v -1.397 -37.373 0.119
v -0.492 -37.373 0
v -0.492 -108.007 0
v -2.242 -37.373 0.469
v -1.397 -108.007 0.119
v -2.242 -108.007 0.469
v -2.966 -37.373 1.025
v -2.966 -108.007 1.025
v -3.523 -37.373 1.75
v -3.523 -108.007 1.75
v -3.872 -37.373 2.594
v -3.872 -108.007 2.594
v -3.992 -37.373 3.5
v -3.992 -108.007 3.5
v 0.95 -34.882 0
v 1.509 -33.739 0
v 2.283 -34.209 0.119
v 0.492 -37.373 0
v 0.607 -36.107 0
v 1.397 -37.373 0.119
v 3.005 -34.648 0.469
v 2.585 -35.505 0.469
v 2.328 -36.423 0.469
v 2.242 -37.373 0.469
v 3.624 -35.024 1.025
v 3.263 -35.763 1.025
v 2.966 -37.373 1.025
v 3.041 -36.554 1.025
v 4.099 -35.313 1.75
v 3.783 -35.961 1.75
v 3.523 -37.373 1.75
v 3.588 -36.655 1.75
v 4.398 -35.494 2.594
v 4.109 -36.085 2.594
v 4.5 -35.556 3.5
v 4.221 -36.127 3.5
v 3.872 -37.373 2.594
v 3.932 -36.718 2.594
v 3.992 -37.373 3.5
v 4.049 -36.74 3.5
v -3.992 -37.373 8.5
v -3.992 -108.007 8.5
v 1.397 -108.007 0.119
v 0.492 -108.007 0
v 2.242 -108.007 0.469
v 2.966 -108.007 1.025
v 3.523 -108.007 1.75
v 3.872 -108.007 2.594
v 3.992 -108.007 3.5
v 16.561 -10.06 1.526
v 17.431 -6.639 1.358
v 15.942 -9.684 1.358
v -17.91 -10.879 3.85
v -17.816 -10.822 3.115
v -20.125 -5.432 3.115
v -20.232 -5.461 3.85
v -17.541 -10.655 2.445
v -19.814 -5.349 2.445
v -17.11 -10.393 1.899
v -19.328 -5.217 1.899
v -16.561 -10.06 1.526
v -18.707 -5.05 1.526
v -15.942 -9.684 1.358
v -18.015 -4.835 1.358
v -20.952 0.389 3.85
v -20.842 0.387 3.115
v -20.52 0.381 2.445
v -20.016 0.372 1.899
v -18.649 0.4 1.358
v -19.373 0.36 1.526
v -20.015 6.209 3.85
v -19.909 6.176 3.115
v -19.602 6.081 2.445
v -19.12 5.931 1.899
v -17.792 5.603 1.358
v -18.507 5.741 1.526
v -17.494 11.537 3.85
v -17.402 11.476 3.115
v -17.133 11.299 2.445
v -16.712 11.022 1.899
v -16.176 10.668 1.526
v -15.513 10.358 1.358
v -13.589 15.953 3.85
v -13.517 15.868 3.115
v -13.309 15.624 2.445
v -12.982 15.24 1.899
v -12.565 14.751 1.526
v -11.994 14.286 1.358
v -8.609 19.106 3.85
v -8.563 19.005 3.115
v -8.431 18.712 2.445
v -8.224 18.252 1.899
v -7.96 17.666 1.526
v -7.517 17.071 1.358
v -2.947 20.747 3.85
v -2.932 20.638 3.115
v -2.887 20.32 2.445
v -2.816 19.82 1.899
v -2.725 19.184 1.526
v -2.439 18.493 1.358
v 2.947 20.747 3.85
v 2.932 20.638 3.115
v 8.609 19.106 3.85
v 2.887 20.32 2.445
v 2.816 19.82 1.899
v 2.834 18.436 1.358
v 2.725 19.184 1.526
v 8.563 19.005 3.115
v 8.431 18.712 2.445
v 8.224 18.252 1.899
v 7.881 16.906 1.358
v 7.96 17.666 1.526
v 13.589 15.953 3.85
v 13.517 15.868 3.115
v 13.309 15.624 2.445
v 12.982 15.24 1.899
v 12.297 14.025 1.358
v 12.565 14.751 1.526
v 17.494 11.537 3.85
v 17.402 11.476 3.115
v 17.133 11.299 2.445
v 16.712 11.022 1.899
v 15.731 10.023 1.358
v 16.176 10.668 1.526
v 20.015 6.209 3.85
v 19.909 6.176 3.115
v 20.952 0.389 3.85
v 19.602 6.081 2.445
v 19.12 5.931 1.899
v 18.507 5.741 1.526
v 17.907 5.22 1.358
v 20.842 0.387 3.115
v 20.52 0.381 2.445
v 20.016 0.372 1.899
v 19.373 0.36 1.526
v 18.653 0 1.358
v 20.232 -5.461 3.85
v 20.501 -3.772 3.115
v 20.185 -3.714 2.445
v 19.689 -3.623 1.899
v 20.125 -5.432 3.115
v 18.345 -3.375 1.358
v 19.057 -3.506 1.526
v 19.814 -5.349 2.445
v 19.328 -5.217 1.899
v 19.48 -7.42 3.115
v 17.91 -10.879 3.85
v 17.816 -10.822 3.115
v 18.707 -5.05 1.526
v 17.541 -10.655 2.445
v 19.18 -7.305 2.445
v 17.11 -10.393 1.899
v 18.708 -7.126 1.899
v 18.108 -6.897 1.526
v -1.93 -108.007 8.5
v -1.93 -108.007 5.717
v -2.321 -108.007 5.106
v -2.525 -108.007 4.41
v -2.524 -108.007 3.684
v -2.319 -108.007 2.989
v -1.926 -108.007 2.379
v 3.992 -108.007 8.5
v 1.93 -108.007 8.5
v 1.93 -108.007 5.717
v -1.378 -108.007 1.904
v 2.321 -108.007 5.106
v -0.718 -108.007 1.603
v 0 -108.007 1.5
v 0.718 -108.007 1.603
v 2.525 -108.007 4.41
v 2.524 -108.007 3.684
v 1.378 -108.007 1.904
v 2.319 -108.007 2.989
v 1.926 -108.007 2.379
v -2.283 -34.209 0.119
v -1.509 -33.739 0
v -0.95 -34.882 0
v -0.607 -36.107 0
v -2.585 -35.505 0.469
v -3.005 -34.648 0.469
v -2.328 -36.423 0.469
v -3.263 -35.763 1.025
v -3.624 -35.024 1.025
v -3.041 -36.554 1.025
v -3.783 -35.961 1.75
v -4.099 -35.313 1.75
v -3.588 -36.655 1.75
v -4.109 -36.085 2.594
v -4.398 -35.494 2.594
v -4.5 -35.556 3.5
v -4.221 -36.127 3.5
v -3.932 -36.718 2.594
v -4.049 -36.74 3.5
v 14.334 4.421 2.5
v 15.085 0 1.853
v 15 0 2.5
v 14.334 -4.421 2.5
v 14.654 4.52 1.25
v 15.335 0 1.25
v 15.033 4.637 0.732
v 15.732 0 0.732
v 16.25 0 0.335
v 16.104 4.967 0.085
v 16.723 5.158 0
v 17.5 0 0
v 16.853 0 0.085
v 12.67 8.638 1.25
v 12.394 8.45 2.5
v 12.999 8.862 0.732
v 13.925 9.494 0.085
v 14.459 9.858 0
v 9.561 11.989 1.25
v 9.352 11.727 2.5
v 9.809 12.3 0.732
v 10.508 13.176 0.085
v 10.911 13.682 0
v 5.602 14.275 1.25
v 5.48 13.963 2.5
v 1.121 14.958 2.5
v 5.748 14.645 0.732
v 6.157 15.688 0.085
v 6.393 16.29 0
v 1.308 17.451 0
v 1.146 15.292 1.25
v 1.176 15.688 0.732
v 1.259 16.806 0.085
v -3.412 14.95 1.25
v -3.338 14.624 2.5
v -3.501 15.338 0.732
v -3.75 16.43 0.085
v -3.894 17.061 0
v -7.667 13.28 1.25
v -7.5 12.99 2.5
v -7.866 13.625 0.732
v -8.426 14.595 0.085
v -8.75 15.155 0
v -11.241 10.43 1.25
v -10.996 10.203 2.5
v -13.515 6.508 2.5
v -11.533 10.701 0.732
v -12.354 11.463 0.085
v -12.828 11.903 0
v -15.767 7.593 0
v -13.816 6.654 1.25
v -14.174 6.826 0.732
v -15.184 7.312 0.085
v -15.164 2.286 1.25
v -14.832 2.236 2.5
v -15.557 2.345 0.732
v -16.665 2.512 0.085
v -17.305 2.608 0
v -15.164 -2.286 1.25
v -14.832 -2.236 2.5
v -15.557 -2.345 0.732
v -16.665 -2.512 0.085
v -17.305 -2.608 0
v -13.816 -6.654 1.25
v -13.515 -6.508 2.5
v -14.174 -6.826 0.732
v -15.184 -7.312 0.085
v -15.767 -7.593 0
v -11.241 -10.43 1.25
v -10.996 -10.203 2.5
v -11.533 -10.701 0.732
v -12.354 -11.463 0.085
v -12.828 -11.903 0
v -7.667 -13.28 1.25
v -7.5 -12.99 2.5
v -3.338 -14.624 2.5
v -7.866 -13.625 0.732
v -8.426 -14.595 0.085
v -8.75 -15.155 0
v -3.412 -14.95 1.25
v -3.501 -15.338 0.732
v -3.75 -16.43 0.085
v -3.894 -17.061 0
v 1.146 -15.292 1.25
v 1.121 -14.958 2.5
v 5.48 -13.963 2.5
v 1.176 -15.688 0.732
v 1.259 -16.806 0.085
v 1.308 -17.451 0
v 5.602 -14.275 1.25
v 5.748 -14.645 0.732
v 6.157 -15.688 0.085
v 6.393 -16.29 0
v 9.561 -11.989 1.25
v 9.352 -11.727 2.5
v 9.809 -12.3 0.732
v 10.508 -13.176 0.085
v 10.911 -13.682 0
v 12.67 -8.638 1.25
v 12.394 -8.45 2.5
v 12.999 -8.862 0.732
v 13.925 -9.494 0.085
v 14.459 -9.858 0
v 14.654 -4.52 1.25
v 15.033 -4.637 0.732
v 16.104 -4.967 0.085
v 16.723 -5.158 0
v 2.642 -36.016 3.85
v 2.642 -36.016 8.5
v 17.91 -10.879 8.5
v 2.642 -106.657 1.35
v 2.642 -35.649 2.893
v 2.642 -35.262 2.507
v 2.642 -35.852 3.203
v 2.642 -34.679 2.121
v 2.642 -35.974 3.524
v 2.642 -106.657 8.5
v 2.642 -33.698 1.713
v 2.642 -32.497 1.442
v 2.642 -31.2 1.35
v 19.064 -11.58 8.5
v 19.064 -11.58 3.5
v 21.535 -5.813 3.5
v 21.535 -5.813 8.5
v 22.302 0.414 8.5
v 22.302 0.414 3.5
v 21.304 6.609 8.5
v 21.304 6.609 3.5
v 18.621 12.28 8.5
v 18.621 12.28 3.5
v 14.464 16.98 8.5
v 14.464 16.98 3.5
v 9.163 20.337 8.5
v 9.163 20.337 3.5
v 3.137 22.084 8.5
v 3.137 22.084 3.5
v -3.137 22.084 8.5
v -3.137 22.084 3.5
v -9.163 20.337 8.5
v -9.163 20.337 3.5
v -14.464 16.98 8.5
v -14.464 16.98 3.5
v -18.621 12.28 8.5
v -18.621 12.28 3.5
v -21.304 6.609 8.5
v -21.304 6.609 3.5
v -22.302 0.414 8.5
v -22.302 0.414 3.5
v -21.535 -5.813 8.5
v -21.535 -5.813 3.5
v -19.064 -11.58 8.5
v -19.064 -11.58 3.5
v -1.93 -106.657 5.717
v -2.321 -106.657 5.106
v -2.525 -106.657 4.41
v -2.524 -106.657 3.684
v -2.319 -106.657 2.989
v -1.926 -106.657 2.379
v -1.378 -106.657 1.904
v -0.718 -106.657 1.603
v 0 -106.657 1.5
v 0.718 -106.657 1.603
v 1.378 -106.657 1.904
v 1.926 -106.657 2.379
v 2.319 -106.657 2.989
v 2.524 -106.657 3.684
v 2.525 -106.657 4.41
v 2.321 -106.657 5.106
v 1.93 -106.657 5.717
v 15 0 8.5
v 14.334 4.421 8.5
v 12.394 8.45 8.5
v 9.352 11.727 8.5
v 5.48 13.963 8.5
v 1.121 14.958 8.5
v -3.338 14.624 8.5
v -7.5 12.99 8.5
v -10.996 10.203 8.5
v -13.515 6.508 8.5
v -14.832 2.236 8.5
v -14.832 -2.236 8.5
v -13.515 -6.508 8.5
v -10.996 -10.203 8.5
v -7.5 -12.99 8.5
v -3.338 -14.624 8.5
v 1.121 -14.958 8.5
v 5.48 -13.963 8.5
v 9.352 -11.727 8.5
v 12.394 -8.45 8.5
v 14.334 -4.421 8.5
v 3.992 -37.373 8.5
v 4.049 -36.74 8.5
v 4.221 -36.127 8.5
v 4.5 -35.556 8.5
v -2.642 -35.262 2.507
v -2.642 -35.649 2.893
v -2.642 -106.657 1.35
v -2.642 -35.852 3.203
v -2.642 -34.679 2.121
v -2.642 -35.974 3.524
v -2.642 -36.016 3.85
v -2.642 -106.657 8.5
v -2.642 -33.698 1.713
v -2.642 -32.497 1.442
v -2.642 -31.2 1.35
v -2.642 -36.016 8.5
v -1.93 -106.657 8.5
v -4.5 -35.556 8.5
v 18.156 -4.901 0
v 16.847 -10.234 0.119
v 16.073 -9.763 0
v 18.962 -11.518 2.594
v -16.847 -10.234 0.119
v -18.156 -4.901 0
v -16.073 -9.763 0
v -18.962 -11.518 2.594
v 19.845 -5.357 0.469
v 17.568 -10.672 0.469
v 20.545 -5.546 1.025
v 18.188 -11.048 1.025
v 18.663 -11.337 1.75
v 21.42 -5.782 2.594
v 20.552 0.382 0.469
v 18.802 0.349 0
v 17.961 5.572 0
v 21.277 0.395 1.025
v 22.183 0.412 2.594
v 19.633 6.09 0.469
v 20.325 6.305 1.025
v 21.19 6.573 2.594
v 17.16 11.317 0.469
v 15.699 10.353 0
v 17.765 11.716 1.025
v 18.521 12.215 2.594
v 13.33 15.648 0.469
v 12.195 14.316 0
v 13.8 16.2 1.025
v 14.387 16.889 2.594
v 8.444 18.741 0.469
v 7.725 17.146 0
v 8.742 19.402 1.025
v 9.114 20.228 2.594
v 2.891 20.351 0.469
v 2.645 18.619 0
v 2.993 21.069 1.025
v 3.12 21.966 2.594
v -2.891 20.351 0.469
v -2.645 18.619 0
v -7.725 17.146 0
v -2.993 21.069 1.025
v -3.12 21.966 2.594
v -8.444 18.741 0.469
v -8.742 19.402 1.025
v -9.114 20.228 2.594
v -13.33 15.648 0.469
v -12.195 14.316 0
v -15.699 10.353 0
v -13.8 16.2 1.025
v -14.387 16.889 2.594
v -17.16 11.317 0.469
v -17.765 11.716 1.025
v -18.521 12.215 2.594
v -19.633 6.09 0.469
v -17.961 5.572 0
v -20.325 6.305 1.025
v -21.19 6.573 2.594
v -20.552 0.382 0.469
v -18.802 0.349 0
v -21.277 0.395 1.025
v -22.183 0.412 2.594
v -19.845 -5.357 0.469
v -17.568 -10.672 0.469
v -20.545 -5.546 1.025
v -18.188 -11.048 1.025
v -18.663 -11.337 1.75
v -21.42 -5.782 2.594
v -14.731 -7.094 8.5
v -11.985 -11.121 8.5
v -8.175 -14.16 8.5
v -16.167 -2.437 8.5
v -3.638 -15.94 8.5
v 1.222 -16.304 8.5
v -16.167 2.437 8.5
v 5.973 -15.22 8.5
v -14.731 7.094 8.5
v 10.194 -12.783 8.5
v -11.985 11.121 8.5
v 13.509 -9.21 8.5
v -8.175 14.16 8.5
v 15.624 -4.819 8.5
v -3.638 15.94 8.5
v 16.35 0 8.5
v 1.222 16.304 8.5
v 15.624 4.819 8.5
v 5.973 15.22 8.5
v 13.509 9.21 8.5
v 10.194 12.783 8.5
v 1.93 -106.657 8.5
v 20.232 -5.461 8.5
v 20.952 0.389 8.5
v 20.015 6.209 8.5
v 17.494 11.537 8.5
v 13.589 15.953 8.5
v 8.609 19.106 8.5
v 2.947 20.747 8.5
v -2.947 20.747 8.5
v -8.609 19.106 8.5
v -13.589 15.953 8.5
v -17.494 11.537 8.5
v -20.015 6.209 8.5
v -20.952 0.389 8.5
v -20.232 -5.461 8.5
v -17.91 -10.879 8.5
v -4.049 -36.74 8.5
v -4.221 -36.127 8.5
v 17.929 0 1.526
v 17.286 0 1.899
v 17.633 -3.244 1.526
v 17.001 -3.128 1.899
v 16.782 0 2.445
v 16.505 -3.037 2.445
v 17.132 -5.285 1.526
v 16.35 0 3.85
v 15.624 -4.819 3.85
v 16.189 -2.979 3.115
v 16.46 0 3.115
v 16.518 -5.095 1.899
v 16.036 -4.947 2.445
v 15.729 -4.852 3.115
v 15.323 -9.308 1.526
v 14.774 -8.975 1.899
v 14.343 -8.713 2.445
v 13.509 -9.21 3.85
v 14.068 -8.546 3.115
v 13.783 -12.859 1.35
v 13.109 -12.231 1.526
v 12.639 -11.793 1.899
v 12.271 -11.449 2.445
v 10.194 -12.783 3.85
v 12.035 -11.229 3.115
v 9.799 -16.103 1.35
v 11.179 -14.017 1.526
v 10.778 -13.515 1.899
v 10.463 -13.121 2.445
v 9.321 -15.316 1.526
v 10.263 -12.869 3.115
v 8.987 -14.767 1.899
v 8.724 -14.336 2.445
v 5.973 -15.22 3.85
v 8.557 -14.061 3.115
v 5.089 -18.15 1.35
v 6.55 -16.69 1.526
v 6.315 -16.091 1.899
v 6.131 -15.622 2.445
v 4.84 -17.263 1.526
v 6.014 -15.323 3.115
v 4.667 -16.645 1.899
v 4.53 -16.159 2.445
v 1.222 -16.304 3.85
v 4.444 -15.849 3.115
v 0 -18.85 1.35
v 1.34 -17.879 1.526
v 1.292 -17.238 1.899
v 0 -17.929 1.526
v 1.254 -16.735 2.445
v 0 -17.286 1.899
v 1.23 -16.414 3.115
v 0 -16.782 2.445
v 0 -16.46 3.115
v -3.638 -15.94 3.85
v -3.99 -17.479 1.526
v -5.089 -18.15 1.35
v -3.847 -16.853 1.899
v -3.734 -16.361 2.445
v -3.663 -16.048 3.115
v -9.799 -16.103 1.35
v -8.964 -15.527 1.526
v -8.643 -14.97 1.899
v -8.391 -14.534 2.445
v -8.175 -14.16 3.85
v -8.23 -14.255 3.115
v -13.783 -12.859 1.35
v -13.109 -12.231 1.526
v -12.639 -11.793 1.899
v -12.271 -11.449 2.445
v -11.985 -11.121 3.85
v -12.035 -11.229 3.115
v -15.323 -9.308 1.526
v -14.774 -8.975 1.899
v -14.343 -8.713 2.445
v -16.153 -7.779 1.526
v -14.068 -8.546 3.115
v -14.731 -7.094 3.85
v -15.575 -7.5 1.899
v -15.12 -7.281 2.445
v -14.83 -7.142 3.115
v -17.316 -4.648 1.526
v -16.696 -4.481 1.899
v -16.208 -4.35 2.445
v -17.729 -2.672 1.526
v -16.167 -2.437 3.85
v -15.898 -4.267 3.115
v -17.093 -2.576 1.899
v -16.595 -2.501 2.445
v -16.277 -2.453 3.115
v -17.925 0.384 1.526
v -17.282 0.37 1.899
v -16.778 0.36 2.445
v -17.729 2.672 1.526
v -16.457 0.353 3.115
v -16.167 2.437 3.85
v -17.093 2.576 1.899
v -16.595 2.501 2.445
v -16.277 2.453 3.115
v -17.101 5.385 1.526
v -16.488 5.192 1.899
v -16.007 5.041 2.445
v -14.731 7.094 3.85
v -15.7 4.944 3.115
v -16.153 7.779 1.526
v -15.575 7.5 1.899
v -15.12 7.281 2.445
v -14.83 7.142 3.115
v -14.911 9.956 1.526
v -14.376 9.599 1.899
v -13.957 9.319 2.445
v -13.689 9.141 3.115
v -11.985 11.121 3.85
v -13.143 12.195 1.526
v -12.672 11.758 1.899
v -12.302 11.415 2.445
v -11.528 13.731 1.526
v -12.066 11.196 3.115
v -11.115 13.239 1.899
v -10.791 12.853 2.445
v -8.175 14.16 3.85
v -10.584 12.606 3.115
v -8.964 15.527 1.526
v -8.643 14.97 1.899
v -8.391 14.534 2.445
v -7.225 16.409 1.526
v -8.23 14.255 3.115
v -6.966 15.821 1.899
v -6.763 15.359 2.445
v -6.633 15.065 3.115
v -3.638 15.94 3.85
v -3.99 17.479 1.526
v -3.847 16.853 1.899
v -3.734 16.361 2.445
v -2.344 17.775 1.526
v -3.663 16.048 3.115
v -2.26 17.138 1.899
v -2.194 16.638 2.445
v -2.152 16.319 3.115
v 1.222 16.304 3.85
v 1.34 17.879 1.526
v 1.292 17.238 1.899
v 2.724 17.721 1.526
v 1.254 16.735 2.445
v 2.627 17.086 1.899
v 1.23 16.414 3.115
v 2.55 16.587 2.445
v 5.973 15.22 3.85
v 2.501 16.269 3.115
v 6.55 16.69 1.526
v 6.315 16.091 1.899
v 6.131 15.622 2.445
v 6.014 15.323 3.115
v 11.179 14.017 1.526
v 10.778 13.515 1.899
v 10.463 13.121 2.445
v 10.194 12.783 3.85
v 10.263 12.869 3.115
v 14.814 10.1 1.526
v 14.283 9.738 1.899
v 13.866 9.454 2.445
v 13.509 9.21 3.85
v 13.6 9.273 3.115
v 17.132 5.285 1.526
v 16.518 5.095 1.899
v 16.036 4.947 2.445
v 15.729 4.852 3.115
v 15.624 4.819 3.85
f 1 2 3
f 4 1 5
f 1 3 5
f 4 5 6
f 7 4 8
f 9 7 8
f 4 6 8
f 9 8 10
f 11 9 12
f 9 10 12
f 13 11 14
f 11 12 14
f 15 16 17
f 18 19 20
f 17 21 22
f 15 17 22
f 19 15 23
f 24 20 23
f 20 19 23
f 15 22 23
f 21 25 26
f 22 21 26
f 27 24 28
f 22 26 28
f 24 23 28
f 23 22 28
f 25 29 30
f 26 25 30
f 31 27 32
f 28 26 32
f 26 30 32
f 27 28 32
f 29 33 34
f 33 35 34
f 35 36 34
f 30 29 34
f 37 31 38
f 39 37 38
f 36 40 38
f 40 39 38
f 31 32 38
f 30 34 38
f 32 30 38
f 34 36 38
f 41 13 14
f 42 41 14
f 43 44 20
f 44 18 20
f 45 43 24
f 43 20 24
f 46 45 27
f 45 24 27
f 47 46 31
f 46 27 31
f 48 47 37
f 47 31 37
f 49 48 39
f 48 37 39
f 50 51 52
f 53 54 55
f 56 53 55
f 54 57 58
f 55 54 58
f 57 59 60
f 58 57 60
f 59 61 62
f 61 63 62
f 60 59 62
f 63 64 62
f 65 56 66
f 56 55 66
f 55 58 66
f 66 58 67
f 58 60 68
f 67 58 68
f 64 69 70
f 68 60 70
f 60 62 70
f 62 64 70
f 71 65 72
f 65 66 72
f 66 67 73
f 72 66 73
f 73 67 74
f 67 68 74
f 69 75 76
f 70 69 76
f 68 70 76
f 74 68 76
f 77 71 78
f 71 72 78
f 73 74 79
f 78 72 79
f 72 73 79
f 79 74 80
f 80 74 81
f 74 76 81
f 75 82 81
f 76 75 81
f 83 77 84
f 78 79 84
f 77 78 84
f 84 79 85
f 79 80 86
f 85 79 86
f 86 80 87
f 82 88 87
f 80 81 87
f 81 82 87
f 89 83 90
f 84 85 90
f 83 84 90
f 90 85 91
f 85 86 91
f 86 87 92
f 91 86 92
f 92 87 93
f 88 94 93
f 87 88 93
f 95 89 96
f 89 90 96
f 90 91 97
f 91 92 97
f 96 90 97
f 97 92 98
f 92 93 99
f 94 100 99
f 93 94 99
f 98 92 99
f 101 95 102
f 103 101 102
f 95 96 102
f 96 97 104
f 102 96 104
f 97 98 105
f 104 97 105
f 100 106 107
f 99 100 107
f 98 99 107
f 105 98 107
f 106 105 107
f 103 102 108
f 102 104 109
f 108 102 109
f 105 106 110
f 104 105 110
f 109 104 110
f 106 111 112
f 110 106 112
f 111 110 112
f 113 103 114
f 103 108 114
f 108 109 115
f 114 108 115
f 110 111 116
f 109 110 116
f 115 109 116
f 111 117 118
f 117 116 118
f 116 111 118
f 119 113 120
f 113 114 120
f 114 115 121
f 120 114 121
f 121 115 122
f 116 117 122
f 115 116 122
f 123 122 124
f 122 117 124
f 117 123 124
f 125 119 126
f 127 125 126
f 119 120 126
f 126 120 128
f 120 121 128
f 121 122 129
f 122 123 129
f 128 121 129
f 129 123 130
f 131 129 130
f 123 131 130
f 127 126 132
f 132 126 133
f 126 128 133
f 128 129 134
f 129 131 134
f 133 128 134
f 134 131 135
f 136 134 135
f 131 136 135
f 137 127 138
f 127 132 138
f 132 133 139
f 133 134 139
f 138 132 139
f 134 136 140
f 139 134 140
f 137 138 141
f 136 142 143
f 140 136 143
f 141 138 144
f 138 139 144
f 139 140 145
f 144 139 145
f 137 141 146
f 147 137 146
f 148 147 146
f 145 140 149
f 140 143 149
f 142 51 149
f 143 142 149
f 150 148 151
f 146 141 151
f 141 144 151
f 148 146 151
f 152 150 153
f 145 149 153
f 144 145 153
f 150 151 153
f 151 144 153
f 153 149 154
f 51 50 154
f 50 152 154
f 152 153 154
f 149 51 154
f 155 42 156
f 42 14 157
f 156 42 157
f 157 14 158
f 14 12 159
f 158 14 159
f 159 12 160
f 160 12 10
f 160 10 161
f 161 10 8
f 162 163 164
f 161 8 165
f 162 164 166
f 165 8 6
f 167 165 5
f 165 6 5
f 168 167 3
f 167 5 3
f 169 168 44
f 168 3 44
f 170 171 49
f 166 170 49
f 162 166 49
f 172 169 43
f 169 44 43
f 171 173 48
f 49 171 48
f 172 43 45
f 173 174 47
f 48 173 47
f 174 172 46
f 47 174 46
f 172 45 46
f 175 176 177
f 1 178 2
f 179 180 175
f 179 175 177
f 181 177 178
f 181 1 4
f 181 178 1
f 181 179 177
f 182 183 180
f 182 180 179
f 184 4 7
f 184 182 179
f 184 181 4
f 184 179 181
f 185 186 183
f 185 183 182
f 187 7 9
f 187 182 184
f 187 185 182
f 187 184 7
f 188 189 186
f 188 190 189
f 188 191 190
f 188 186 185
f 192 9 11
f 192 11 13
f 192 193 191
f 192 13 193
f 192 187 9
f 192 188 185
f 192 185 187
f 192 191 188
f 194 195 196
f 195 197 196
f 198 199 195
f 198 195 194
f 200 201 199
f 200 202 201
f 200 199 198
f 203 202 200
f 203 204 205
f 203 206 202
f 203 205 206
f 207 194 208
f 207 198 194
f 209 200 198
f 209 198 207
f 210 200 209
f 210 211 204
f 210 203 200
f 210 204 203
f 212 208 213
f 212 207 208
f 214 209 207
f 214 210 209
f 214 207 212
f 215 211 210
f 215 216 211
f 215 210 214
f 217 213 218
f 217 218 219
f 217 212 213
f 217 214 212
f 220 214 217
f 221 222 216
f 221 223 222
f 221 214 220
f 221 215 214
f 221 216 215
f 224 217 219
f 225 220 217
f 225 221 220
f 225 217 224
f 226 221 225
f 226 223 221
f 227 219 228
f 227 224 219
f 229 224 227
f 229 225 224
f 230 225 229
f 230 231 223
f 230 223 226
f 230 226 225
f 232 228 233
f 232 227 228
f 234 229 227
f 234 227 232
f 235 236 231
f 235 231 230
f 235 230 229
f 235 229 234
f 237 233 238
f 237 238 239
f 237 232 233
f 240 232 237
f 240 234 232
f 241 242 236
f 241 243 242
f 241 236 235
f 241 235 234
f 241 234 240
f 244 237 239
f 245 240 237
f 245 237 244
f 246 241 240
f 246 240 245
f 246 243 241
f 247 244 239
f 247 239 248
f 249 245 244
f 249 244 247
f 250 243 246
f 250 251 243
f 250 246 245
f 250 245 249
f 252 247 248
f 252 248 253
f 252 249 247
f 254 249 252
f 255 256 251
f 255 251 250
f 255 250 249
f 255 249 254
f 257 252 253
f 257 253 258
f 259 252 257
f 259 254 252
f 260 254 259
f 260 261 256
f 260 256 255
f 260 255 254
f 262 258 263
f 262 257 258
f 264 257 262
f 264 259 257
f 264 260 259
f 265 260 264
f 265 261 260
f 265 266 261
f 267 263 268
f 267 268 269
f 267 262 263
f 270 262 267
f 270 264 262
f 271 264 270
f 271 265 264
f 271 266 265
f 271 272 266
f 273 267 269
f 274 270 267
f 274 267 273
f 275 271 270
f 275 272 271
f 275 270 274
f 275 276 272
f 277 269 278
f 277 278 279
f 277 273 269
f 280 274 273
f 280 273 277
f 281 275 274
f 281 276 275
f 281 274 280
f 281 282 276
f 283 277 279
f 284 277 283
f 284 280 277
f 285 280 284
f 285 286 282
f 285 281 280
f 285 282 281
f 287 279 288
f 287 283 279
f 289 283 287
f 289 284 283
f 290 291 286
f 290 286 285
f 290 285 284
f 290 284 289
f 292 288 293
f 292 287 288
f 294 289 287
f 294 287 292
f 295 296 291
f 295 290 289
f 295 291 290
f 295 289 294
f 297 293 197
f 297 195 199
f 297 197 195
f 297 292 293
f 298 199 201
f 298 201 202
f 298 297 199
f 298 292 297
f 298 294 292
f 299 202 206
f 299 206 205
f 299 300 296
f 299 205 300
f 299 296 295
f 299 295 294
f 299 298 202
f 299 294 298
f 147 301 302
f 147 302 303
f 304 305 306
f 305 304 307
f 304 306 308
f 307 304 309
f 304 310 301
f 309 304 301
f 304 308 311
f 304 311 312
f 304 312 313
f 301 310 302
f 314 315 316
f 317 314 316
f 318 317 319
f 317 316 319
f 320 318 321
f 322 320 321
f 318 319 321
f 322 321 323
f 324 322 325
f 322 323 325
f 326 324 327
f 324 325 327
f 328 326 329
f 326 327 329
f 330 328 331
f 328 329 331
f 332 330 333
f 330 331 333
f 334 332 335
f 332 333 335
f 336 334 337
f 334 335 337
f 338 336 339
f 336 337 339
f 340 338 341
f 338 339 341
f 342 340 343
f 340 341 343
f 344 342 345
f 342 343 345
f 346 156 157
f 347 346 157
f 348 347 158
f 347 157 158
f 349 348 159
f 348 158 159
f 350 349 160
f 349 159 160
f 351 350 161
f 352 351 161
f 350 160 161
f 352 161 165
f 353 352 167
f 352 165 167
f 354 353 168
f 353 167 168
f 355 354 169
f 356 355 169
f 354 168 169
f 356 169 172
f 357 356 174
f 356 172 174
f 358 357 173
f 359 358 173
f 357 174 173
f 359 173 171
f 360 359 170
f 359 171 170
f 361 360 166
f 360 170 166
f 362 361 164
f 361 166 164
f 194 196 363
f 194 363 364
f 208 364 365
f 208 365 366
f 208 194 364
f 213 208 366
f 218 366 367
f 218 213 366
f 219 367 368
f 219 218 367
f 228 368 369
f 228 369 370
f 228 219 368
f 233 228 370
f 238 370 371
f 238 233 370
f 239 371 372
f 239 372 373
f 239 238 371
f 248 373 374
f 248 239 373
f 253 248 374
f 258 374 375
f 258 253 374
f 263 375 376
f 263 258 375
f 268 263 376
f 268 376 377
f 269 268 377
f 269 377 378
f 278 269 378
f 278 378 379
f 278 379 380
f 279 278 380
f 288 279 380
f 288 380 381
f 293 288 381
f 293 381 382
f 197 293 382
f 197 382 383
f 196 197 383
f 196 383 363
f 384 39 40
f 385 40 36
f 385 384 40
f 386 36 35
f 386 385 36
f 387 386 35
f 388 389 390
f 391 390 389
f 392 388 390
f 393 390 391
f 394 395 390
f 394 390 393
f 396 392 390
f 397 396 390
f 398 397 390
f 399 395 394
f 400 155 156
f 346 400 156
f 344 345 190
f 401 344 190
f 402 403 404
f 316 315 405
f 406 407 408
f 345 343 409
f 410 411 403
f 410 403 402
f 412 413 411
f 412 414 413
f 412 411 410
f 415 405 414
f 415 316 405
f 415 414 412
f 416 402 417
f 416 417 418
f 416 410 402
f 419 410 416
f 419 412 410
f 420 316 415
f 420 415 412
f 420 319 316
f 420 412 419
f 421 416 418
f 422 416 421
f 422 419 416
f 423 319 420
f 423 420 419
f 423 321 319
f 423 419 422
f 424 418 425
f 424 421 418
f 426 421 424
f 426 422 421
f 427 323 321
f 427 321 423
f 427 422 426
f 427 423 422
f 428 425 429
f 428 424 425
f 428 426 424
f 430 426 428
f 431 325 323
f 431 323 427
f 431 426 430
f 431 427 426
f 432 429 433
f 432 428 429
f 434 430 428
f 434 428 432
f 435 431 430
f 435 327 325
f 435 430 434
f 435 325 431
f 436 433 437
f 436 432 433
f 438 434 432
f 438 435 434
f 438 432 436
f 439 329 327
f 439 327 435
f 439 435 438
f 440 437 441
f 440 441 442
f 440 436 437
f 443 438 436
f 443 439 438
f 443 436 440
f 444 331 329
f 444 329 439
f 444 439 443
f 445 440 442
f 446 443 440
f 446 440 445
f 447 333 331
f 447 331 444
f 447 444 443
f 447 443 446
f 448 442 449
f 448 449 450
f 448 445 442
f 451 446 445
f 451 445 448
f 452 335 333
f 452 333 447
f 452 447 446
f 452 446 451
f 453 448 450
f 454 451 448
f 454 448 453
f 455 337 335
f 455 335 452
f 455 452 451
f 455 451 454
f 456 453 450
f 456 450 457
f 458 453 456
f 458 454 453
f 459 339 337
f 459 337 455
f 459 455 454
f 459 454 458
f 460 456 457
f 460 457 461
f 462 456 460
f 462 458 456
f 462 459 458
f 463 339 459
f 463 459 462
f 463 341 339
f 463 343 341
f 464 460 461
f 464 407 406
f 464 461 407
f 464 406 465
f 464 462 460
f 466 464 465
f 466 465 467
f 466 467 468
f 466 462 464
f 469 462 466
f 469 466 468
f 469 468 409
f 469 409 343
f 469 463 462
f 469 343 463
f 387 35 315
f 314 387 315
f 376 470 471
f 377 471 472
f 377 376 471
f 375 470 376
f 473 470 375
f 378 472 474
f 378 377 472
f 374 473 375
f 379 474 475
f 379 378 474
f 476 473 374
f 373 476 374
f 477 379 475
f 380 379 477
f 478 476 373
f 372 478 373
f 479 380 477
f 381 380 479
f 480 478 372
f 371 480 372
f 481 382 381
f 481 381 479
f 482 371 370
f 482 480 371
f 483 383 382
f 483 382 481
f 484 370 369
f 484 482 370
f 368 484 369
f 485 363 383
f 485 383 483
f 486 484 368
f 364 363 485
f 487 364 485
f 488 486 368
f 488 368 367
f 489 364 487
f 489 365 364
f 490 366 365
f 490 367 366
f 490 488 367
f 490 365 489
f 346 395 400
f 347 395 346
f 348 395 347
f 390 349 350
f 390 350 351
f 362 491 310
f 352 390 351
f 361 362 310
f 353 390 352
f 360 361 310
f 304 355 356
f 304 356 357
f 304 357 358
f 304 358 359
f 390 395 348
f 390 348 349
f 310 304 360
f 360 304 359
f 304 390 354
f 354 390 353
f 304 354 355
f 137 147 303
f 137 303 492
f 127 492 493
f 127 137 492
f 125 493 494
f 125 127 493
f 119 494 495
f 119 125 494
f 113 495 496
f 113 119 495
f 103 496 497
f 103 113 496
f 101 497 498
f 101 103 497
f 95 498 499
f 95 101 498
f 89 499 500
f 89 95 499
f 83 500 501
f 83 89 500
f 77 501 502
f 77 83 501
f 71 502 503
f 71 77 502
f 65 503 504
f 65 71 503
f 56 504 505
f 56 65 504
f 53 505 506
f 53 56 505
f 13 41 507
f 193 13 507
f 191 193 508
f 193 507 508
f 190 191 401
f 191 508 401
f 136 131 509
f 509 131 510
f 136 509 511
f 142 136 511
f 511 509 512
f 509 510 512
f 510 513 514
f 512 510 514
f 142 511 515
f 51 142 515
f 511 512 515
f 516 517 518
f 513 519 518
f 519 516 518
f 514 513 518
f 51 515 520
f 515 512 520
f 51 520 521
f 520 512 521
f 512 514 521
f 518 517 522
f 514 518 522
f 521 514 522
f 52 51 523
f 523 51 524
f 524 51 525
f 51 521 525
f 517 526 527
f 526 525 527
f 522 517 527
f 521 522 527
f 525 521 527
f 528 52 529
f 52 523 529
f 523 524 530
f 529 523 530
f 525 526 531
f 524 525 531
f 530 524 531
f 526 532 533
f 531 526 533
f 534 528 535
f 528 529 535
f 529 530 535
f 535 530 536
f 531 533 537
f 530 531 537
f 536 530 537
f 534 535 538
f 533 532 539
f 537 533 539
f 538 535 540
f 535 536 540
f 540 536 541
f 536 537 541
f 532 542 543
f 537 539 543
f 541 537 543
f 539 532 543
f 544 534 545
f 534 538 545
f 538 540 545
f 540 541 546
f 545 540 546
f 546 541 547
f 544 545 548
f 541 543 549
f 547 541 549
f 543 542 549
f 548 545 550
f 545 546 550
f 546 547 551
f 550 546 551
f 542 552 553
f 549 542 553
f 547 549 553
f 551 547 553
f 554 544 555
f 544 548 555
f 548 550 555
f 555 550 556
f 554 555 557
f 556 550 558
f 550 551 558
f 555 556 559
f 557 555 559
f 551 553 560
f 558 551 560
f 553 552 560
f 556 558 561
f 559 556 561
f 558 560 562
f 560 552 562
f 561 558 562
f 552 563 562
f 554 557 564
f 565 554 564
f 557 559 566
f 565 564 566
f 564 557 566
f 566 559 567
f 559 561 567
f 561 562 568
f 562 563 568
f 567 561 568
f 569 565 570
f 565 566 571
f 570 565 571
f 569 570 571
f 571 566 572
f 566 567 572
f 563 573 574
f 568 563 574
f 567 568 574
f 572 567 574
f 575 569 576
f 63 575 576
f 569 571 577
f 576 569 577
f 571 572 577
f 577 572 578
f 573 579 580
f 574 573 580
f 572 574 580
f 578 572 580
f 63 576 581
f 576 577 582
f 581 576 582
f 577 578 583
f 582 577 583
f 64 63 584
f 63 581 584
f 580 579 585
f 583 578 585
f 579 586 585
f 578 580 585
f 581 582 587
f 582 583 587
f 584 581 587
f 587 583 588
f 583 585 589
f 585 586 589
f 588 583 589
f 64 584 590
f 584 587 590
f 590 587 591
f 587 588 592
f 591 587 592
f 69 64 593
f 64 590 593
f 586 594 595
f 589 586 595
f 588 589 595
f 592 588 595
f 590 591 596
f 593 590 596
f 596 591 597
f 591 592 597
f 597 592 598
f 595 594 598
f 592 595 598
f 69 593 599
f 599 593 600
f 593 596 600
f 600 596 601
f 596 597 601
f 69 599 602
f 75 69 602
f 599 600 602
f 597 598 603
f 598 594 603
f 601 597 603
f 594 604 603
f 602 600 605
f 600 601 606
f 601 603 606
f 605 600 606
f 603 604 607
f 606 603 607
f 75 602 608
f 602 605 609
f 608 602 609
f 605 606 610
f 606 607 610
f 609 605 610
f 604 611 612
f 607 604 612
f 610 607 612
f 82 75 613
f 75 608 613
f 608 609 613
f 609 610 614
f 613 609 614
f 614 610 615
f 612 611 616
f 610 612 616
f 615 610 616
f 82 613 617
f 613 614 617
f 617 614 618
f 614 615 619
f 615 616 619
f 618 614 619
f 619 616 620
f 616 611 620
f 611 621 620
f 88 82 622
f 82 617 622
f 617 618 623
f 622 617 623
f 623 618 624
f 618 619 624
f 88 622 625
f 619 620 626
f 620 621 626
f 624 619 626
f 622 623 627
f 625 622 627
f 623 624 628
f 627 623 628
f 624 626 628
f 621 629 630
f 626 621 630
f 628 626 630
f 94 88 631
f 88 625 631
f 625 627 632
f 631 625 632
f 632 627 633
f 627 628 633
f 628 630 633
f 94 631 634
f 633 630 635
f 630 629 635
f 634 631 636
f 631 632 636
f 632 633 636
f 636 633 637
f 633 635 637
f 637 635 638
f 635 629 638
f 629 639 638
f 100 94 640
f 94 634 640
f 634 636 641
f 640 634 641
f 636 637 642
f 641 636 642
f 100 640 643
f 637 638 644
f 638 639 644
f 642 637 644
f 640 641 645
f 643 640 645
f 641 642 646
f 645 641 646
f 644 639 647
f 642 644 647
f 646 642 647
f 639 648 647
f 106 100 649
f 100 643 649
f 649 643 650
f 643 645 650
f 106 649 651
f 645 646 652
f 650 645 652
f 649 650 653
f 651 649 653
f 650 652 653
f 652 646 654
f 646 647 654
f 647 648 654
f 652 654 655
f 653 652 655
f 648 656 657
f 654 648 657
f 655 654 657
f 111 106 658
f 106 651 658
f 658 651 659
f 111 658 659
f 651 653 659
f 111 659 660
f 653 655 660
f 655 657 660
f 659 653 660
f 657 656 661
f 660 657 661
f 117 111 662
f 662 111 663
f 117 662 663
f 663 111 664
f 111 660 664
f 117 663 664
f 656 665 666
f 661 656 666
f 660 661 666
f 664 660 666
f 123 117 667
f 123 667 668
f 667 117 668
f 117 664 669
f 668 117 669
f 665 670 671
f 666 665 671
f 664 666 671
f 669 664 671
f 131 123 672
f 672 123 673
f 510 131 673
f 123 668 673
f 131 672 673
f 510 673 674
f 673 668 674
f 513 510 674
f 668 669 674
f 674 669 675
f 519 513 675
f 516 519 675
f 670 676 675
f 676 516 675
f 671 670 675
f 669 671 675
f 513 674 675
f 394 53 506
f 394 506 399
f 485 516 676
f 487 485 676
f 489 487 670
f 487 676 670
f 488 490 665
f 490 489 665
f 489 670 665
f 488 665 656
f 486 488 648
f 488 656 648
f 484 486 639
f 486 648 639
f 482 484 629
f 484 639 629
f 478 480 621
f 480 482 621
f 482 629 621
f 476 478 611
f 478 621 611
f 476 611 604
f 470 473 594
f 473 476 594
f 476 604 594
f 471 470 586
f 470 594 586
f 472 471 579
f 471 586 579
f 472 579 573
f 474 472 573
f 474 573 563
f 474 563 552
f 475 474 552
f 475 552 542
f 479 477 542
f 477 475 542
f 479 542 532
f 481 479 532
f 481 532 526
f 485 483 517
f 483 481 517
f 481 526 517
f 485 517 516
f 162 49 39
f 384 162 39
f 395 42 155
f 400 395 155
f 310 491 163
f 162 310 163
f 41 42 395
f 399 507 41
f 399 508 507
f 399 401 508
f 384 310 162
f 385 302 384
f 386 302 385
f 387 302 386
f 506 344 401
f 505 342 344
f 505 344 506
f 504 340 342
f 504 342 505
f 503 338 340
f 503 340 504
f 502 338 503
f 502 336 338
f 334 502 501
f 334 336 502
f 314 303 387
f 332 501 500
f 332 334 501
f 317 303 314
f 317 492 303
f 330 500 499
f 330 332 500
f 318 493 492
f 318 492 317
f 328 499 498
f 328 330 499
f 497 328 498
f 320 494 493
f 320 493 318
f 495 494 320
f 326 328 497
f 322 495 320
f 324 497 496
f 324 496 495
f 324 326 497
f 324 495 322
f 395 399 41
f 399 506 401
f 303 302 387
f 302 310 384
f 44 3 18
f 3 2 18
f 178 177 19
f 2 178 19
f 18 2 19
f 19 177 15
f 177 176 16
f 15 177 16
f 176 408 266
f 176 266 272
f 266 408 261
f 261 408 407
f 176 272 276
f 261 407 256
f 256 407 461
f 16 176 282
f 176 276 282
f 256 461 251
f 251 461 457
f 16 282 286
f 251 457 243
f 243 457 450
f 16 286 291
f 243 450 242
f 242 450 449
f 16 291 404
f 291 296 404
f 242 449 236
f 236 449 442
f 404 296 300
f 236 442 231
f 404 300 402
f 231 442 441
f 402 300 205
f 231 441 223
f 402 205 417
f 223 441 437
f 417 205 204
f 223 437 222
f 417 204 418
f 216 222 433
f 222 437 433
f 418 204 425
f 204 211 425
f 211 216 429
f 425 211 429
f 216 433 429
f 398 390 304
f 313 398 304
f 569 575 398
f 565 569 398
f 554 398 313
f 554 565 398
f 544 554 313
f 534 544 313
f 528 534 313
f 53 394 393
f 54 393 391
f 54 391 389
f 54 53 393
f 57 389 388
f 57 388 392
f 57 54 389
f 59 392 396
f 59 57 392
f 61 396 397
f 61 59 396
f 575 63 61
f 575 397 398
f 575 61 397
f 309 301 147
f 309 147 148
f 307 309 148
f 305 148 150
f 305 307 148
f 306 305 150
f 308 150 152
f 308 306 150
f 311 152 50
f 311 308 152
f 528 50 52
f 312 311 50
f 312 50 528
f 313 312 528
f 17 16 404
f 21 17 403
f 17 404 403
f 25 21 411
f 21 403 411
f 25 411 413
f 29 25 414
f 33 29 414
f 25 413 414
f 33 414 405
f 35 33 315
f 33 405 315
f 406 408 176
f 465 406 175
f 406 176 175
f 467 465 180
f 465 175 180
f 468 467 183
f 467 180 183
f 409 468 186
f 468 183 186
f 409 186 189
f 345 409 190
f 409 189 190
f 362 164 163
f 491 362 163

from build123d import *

# Parameters (mm, degrees)
F0_R         = 15
F1_DEPTH     = 8.5
F2_T         = -1.35
F4_DEPTH     = 80
F5_R         = 3.5
F6_T3_ANGLE  = 242.5524848973
F6_T9_DEPTH  = 35.6602445691
F6_T13_DEPTH = 35.6602445691


# Not quite as in the source:
# - a fillet or chamfer that OpenCascade refuses, or shapes differently, is made with other operations: its cross-section is extruded or revolved along the edge and cut away or added


with BuildPart() as f1:
    # F0 (on Top) → F1 (new body)
    with BuildSketch(Plane.XY):
        with BuildLine():
            Line((-3.9915498981, -108.0066443023), (3.9915498981, -108.0066443023))
            Line((3.9915498981, -108.0066443023), (3.9915498981, -36.3935431888))
            Line((3.9915498981, -36.3935431888), (19.064122832, -11.5803439591))
            ThreePointArc((19.064122832, -11.5803439591), (0, 22.3057200189), (-19.064122832, -11.5803439591))
            Line((-19.064122832, -11.5803439591), (-3.9915498981, -36.3935431888))
            Line((-3.9915498981, -36.3935431888), (-3.9915498981, -108.0066443023))
        make_face()
        Circle(F0_R, mode=Mode.SUBTRACT)
    extrude(amount=F1_DEPTH)

    # F2
    f2_openings = [f1.faces().sort_by_distance(p)[0] for p in [
        (0, -28.543568, 8.5),
    ]]
    offset(amount=F2_T, openings=f2_openings, kind=Kind.INTERSECTION)

    # F3 (on face) → F4 (cut)
    with BuildSketch(Plane.XZ.offset(108.0066443023)):
        with BuildLine():
            Line((-1.9299790729, 8.5), (-1.9299790729, 5.7166375665))
            ThreePointArc((-1.9299790729, 5.7166375665), (0, 1.5), (1.9299790729, 5.7166375665))
            Line((1.9299790729, 5.7166375665), (1.9299790729, 8.5))
            Line((1.9299790729, 8.5), (-1.9299790729, 8.5))
        make_face()
    extrude(amount=-F4_DEPTH, mode=Mode.SUBTRACT)

    # F5
    f5_edges = [f1.edges().sort_by_distance(p)[0] for p in [
        (3.99155, -36.393543, 4.25),
        (-3.99155, -36.393543, 4.25),
        (-11.527836, -23.986944, 0),
        (3.99155, -72.200094, 0),
        (11.527836, -23.986944, 0),
        (0, 22.30572, 0),
        (-3.99155, -72.200094, 0),
    ]]
    fillet(f5_edges, radius=F5_R)

    # F6: fillet of radius 2.5 on 5 edges, made by hand


with BuildPart() as f6_tool1:
    # F6_s2 → F6_t3 (revolve)
    with BuildSketch(Plane(origin=(0, 0, 0), x_dir=(0, 0, 1), z_dir=(0.519164768, -0.854674174, 0))):
        with BuildLine():
            ThreePointArc((3.85, 20.9557200189), (2.082233047, 20.2234869719), (1.35, 18.4557200189))
            Line((1.35, 18.4557200189), (1.35, 20.9557200189))
            Line((1.35, 20.9557200189), (3.85, 20.9557200189))
        make_face()
    revolve(axis=Axis((0, 0, 1.35), (0, 0, -1)), revolution_arc=F6_T3_ANGLE)


with BuildPart() as f6_tool4:
    # F6_s5 → F6_t6 (revolve)
    with BuildSketch(Plane.XZ):
        with BuildLine():
            ThreePointArc((18.85, 1.35), (17.082233047, 2.082233047), (16.35, 3.85))
            Line((16.35, 3.85), (16.35, 1.35))
            Line((16.35, 1.35), (18.85, 1.35))
        make_face()
    revolve(axis=Axis((0, 0, 1.35), (0, 0, -1)))


with BuildPart() as f6_tool7:
    # F6_s8 → F6_t9 (new body)
    with BuildSketch(Plane(origin=(0, 0, 0), x_dir=(0, 0, 1), z_dir=(0.519164768, -0.854674174, 0))):
        with BuildLine():
            ThreePointArc((3.85, 20.9557200189), (2.082233047, 20.2234869719), (1.35, 18.4557200189))
            Line((1.35, 18.4557200189), (1.35, 20.9557200189))
            Line((1.35, 20.9557200189), (3.85, 20.9557200189))
        make_face()
    extrude(amount=F6_T9_DEPTH)

    split(bisect_by=Plane.YZ.offset(-2.6415498981), keep=Keep.BOTTOM)


with BuildPart() as f6_tool11:
    # F6_s12 → F6_t13 (new body)
    with BuildSketch(Plane(origin=(-18.5135425991, -30.4778900706, 0), x_dir=(0, 0, 1), z_dir=(0.519164768, 0.854674174, 0))):
        with BuildLine():
            ThreePointArc((3.85, 20.9557200189), (2.082233047, 20.2234869719), (1.35, 18.4557200189))
            Line((1.35, 18.4557200189), (1.35, 20.9557200189))
            Line((1.35, 20.9557200189), (3.85, 20.9557200189))
        make_face()
    extrude(amount=F6_T13_DEPTH)

    split(bisect_by=Plane.YZ.offset(2.6415498981), keep=Keep.TOP)


with BuildPart() as f1_1:
    add(f1.part)

    # F6_t15: union F6_tool1, F6_tool4, F6_tool7, F6_tool11
    add([f6_tool1.part, f6_tool4.part, f6_tool7.part, f6_tool11.part])

    # F6_s16 → F6_t17 (revolve, cut)
    with BuildSketch(Plane.XZ):
        with BuildLine():
            ThreePointArc((15, 2.5), (15.732233047, 0.732233047), (17.5, 0))
            Line((17.5, 0), (15, 0))
            Line((15, 0), (15, 2.5))
        make_face()
    revolve(axis=Axis((0, 0, 0), (0, 0, 1)), mode=Mode.SUBTRACT)


solid = f1_1.part
